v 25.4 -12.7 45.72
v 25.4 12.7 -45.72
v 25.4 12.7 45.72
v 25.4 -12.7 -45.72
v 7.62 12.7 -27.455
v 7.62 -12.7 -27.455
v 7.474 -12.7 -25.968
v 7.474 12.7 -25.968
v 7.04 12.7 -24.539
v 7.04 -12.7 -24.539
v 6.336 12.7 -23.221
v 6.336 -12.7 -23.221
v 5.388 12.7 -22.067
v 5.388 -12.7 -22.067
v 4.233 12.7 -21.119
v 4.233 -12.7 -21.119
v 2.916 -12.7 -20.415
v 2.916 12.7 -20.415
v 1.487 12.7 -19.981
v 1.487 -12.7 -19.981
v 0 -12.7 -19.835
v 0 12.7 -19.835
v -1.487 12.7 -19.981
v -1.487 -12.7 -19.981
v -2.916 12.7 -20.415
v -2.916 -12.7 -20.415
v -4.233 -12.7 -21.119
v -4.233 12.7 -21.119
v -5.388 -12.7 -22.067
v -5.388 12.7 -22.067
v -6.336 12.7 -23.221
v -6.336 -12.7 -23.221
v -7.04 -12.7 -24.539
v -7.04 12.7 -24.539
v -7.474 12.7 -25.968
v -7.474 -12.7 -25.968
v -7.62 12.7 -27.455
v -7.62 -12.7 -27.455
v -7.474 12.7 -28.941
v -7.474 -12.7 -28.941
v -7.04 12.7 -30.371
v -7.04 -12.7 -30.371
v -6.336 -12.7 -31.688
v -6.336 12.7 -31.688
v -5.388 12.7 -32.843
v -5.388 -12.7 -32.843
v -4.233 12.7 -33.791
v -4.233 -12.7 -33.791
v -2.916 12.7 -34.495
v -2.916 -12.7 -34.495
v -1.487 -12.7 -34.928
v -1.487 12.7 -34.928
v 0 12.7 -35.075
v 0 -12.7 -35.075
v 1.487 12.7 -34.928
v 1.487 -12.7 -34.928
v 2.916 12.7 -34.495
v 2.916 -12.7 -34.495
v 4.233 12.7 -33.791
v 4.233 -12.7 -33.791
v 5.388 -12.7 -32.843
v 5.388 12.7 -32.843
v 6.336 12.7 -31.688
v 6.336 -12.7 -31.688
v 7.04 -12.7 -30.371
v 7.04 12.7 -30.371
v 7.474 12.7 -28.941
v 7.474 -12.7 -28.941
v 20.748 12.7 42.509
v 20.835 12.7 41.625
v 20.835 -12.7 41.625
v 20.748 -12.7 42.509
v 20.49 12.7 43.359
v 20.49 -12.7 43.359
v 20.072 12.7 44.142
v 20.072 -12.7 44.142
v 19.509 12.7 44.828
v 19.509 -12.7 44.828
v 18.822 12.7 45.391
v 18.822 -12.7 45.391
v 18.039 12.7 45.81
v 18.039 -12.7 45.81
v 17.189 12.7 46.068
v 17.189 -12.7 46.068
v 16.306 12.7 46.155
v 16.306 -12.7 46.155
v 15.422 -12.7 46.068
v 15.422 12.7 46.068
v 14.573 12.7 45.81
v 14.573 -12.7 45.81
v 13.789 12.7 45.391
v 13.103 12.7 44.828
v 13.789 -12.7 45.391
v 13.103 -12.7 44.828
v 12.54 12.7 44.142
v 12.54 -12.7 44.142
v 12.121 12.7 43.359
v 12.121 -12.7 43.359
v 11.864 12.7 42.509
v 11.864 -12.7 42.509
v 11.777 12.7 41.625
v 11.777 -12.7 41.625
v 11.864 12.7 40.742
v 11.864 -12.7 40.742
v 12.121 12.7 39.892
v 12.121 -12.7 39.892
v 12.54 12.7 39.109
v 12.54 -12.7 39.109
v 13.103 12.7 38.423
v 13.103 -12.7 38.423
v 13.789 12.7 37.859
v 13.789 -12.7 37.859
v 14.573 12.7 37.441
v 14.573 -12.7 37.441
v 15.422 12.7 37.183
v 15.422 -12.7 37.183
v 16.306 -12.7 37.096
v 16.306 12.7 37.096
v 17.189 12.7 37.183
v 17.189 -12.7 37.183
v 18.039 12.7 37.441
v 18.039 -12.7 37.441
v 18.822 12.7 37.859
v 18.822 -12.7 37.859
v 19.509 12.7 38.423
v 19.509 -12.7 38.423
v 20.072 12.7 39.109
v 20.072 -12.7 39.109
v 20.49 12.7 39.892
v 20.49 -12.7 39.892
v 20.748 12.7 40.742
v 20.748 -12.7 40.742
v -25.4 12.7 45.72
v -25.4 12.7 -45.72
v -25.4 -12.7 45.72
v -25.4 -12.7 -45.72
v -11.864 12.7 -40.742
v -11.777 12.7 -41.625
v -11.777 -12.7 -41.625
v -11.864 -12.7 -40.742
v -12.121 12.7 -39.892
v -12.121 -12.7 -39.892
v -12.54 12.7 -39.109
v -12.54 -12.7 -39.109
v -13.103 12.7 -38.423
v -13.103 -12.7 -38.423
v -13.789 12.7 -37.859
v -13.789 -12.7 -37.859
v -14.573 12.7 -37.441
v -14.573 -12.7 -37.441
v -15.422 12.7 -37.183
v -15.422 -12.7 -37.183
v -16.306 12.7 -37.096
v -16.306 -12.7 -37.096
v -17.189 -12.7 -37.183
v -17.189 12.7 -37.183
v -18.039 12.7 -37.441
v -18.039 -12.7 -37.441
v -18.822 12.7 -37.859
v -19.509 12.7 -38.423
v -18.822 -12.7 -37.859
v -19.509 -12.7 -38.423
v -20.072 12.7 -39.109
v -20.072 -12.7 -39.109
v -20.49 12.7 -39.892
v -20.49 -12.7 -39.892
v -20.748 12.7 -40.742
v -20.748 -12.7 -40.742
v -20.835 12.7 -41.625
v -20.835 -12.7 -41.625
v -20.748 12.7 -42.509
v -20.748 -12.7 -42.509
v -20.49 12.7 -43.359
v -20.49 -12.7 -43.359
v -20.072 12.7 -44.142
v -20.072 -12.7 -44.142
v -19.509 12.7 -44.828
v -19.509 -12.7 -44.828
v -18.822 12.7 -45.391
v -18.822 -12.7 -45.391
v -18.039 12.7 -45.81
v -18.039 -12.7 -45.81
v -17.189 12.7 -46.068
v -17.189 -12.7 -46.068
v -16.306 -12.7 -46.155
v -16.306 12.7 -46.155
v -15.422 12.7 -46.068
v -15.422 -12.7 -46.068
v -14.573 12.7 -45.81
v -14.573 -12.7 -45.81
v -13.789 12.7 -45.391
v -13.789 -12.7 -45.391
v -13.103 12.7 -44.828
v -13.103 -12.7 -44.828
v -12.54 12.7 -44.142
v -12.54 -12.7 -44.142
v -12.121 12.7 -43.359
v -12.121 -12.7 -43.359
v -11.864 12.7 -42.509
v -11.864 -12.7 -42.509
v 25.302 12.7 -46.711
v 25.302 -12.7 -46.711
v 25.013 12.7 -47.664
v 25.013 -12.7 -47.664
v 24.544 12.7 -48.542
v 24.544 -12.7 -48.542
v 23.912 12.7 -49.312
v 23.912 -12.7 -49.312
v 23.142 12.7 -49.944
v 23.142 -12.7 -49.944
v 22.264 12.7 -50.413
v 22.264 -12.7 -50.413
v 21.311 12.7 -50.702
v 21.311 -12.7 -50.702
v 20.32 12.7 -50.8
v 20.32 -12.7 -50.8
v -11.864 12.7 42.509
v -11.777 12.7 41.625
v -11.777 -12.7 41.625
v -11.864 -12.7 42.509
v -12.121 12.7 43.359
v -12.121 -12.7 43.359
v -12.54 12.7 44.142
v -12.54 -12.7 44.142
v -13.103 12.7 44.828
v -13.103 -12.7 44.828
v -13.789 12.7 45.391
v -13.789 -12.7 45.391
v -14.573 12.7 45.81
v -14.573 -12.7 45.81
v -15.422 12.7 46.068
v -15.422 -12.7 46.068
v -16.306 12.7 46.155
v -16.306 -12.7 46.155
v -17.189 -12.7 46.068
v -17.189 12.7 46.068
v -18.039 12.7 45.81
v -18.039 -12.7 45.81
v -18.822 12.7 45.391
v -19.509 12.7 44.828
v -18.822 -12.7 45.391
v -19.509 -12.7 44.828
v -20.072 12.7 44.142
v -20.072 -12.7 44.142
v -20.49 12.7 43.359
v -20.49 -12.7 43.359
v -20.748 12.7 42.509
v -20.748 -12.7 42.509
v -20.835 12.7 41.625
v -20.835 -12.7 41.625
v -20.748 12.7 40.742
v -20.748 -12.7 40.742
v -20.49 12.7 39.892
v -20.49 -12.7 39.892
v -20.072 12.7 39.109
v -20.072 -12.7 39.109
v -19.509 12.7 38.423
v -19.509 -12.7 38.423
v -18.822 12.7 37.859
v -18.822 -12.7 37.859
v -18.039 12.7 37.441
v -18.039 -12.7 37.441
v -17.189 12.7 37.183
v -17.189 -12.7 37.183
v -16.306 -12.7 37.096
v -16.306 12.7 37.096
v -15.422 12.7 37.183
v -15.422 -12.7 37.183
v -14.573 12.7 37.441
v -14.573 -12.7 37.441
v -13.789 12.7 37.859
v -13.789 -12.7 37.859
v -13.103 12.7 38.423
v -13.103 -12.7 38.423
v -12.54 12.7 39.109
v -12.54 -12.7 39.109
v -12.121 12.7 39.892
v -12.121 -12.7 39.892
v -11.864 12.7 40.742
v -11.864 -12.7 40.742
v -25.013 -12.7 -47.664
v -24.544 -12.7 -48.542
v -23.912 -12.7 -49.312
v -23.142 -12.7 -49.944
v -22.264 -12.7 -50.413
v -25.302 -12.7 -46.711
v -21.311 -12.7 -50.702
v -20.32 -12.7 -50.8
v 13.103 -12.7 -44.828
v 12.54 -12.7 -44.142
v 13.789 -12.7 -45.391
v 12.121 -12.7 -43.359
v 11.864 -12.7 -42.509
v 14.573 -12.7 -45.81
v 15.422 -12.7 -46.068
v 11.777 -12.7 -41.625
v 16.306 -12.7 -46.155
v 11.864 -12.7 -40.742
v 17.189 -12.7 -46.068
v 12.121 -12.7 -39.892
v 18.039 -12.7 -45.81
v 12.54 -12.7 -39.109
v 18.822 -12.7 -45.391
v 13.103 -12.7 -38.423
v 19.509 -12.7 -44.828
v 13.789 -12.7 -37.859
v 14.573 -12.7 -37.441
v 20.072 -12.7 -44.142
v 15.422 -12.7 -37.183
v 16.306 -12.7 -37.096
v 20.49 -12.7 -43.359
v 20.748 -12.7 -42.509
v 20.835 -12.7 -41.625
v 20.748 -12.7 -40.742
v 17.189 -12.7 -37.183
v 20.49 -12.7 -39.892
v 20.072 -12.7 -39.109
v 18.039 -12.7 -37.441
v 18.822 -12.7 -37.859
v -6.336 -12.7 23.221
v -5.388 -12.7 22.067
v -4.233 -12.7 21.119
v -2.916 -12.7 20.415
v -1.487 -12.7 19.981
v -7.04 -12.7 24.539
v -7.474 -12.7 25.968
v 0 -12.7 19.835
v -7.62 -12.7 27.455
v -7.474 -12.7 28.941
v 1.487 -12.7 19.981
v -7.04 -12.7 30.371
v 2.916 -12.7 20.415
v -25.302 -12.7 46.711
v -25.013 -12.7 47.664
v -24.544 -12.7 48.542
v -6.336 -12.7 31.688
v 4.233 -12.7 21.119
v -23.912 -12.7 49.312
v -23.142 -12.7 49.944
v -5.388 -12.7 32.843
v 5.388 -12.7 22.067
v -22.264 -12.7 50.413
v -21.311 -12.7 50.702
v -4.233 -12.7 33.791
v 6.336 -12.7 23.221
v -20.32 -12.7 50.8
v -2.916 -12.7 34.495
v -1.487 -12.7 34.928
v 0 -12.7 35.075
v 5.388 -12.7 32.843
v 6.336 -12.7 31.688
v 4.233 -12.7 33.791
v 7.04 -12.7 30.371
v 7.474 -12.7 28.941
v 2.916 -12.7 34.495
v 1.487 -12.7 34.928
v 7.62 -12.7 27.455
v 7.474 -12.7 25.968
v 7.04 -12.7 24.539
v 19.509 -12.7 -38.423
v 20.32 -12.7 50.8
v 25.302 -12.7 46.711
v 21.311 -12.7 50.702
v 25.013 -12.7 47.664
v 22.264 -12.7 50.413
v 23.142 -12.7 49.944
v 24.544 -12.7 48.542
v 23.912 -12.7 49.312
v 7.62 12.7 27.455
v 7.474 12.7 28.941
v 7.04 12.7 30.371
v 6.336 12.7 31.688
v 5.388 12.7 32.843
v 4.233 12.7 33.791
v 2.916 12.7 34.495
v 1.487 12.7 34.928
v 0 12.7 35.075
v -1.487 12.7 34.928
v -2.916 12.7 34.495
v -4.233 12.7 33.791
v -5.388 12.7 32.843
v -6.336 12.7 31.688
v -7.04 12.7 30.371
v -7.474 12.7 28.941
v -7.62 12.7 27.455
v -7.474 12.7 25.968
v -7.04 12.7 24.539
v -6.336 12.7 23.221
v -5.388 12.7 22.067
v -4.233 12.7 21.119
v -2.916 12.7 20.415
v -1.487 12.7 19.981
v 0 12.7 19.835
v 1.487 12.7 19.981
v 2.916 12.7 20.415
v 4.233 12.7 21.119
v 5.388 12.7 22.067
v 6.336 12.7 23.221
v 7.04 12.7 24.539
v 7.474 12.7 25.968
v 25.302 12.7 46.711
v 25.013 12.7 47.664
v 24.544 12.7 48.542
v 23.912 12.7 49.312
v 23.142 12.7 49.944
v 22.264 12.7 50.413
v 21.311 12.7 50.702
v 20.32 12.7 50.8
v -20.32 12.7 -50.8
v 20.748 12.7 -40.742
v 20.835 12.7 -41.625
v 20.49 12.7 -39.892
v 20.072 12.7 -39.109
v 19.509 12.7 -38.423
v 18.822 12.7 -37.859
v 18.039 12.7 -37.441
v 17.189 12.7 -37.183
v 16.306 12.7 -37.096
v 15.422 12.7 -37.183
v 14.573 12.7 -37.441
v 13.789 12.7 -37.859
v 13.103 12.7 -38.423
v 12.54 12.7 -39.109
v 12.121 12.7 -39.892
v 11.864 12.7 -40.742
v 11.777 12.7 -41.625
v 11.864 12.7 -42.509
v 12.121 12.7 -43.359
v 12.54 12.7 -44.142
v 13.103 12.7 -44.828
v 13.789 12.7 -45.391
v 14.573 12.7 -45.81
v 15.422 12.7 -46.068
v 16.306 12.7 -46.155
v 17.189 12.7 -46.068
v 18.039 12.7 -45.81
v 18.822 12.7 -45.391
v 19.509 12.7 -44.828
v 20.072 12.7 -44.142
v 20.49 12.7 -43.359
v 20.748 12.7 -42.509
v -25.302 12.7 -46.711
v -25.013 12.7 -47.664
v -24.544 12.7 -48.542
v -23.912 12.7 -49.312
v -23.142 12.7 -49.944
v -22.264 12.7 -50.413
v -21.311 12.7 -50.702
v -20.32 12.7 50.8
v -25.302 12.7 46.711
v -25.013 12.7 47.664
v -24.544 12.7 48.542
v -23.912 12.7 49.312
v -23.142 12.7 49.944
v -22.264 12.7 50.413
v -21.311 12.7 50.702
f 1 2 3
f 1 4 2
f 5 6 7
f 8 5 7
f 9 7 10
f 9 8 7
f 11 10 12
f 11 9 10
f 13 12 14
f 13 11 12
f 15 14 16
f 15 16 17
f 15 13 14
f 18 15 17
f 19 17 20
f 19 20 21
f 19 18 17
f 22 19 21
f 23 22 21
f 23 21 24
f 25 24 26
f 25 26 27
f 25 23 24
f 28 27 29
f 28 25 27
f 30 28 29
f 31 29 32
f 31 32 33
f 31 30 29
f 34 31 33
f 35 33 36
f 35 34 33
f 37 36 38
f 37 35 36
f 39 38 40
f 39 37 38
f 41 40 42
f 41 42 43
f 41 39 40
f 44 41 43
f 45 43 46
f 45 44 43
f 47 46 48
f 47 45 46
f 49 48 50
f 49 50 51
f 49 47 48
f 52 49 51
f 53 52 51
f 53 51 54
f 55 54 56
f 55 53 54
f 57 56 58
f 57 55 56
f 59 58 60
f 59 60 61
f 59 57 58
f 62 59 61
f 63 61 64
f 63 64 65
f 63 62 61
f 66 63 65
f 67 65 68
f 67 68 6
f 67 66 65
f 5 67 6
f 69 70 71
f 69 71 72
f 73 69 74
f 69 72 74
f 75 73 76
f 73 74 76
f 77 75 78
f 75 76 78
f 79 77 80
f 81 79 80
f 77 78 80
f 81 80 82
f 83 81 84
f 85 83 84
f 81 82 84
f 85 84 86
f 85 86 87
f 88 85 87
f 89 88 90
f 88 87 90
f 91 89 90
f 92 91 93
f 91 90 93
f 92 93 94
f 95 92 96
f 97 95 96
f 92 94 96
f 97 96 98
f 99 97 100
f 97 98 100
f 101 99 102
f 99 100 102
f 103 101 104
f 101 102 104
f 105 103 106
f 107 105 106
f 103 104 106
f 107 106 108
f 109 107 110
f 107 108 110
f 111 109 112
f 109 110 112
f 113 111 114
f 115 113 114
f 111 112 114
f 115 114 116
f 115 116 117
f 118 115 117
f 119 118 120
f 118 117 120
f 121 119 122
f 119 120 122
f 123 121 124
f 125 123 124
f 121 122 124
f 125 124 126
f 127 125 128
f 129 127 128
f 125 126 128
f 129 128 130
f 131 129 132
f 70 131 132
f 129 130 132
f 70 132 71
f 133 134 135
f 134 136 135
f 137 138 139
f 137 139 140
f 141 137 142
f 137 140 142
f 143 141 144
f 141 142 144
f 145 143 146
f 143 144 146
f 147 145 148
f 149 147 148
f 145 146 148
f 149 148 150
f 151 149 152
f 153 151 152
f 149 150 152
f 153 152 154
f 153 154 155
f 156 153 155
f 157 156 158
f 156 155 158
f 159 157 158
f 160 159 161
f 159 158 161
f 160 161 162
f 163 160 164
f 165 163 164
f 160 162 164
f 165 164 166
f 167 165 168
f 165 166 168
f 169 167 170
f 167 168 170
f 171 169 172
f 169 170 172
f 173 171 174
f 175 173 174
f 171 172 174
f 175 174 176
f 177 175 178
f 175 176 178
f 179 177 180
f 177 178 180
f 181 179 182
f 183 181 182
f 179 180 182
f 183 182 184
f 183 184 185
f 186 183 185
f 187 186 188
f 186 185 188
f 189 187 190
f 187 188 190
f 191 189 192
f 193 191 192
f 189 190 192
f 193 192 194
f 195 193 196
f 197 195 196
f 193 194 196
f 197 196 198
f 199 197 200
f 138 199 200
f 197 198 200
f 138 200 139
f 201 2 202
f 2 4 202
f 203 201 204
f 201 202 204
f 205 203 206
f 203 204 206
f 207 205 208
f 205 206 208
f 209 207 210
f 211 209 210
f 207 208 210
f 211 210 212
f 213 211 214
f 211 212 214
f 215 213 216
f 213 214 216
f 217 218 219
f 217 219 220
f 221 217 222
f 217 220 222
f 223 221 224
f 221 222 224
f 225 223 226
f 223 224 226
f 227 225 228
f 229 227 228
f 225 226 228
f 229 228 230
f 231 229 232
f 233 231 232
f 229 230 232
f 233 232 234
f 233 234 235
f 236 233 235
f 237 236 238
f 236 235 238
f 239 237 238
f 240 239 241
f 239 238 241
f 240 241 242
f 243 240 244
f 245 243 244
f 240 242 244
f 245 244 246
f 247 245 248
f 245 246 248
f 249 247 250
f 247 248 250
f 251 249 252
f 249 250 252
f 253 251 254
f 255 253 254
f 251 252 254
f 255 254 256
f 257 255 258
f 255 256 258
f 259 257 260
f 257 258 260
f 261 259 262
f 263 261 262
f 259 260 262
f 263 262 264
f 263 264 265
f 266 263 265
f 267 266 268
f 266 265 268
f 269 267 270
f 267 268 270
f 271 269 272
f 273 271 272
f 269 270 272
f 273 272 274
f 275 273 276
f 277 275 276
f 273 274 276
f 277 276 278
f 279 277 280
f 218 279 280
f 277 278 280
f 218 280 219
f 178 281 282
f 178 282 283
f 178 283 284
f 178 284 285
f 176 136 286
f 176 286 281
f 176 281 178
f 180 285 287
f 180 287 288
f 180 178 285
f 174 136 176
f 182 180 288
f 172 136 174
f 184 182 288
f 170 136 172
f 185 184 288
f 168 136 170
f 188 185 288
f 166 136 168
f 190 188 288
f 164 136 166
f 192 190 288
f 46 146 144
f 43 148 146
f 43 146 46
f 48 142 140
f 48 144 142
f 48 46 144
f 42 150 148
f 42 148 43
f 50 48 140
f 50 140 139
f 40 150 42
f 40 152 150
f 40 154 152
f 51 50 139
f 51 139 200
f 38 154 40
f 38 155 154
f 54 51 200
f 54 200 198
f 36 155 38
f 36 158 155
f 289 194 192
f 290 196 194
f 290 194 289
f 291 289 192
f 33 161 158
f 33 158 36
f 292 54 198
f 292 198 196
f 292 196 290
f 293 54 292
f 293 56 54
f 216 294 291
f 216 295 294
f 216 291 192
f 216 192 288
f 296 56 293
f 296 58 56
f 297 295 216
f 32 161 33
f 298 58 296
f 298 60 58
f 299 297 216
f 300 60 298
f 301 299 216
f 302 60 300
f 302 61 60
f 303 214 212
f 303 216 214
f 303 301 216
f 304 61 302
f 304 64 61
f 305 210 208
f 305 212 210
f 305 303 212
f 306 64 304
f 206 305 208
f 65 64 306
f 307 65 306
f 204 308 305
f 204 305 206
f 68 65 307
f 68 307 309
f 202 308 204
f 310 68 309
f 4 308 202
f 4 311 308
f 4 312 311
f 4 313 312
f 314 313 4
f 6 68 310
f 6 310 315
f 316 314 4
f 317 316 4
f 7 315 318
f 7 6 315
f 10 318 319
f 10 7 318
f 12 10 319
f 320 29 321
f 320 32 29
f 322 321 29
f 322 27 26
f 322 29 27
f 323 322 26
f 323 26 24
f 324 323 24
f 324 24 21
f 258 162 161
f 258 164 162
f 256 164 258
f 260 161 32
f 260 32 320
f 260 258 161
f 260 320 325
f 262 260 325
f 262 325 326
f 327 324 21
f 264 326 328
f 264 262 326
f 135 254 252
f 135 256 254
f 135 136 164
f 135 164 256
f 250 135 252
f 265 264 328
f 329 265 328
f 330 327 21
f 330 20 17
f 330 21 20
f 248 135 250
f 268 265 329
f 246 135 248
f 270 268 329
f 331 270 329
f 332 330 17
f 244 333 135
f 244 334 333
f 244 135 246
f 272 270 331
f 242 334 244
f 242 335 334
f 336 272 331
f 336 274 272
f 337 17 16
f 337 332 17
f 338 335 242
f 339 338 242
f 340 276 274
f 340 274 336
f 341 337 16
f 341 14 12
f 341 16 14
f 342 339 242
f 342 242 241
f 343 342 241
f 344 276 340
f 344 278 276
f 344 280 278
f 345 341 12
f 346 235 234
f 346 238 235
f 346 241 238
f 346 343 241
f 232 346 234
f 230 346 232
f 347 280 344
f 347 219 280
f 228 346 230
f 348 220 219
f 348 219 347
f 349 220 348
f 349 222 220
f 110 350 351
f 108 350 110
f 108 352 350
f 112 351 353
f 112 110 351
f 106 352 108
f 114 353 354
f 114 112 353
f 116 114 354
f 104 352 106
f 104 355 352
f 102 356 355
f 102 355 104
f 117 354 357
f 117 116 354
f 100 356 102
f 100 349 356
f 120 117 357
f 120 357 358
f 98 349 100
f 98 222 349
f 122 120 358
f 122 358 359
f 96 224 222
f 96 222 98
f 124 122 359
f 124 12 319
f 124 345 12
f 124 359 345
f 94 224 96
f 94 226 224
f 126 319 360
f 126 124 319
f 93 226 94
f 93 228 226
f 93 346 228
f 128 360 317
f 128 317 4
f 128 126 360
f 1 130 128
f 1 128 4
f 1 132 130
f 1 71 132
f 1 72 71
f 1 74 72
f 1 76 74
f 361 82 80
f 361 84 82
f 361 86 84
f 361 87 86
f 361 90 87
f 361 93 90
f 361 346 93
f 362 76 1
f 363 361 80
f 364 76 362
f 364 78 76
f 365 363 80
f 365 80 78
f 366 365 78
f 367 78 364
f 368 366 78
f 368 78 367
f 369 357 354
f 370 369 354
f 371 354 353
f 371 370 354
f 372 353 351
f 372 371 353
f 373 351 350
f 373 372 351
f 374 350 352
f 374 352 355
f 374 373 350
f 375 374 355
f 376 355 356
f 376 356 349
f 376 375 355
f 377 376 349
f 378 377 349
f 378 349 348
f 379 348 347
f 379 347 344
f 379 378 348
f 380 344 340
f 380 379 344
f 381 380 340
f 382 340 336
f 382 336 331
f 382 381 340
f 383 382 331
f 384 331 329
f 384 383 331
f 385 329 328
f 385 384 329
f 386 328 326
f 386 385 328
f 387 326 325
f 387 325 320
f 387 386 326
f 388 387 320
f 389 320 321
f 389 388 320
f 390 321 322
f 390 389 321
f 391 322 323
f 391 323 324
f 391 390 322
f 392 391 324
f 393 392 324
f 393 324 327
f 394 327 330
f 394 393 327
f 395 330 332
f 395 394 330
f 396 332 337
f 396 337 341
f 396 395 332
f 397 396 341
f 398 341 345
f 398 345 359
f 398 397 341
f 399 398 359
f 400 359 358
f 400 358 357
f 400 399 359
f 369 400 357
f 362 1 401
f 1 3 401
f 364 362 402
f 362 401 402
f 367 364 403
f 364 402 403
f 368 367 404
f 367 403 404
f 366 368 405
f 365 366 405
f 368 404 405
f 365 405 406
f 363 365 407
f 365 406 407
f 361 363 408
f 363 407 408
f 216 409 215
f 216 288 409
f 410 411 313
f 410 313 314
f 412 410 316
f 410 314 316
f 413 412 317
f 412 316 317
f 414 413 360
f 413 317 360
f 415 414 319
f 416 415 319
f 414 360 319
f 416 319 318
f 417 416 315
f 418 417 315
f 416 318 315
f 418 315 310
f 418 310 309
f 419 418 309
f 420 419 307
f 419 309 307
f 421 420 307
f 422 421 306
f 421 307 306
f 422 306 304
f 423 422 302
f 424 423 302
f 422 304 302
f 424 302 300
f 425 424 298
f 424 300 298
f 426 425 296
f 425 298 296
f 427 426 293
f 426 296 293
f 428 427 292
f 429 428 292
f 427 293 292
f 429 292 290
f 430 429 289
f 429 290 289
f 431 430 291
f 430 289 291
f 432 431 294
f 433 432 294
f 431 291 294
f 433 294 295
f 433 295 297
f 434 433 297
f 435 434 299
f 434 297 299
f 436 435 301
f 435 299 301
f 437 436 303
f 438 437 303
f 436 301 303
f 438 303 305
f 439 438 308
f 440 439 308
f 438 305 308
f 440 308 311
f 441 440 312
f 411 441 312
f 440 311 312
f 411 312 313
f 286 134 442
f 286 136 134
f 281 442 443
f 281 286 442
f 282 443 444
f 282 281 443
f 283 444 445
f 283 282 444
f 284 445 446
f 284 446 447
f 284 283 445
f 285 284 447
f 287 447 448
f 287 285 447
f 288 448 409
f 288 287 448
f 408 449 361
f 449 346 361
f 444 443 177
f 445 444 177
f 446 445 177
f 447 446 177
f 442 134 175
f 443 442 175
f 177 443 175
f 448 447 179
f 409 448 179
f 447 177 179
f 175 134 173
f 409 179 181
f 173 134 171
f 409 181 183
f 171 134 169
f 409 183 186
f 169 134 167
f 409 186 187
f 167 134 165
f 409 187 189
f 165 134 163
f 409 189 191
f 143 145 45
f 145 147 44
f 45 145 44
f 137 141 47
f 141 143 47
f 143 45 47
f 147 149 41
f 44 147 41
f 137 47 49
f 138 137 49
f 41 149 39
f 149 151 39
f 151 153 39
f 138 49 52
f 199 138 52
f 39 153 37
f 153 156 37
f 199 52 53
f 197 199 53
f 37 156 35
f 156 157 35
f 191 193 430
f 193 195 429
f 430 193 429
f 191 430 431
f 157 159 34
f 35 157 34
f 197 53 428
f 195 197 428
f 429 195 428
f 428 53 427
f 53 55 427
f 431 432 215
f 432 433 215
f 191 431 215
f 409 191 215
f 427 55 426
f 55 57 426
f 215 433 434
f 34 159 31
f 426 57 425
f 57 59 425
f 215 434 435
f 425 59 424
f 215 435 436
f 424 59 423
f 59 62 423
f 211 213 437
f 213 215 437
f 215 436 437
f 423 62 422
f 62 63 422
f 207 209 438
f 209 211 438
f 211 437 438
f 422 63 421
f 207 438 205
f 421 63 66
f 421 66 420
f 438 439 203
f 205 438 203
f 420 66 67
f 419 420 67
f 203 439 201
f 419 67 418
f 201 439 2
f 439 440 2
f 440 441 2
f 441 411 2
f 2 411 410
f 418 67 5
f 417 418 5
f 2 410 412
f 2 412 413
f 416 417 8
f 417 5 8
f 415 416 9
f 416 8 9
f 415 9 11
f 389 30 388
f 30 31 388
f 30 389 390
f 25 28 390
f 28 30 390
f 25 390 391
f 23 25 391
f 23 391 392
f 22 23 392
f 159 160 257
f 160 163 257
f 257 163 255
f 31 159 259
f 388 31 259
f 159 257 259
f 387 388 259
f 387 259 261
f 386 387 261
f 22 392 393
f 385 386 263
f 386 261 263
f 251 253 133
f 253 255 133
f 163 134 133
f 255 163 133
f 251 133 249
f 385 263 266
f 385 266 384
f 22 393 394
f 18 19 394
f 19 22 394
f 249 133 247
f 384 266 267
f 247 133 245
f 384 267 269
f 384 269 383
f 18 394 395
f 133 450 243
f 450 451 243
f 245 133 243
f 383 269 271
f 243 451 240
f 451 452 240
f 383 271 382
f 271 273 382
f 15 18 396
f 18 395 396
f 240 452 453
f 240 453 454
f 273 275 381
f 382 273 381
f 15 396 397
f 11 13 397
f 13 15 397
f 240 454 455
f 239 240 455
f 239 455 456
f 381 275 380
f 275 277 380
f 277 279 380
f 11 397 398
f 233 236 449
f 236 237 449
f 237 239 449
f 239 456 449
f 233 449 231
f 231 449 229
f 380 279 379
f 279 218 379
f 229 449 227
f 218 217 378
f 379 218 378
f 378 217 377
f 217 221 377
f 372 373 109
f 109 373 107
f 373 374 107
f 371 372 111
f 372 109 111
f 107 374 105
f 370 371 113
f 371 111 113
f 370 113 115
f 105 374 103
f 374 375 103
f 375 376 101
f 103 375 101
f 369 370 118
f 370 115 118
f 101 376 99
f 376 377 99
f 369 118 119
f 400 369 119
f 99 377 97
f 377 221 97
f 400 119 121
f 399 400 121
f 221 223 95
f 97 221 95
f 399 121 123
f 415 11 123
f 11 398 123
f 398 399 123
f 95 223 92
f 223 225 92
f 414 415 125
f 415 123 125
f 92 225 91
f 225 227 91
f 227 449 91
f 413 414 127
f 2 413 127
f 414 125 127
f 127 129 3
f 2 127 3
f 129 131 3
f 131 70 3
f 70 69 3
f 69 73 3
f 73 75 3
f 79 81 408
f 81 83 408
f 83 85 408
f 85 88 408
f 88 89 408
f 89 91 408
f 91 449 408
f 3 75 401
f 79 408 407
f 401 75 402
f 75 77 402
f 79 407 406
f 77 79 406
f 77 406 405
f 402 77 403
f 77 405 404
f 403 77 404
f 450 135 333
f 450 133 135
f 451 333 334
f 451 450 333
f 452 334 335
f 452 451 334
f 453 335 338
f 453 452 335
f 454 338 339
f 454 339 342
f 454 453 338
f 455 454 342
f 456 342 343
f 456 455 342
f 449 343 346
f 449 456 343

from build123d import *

# Parameters (mm, degrees)
F0_W     = 50.8
F0_H     = 101.6
F0_R     = 7.62
F1_DEPTH = 12.7
F2_R     = 5.08
F3_R     = 4.529312
F4_DEPTH = 25.4


with BuildPart() as f1:
    # F0 (on Front) → F1 (new body, symmetric)
    with BuildSketch(Plane.XZ):
        Rectangle(F0_W, F0_H)
        with Locations((0, -27.454738)):
            Circle(F0_R, mode=Mode.SUBTRACT)
        with Locations((0, 27.454738)):
            Circle(F0_R, mode=Mode.SUBTRACT)
    extrude(amount=F1_DEPTH, both=True)

    # F2
    f2_edges = [f1.edges().sort_by_distance(p)[0] for p in [
        (25.4, 0, 50.8),
        (-25.4, 0, 50.8),
        (-25.4, 0, -50.8),
        (25.4, 0, -50.8),
    ]]
    fillet(f2_edges, radius=F2_R)

    # F3 (on face) → F4 (cut, through all)
    with BuildSketch(Plane.XZ.offset(12.7)):
        with Locations((-16.305836, 41.625459)):
            Circle(F3_R)
        with Locations((16.305836, 41.625459)):
            Circle(F3_R)
        with Locations((-16.305836, -41.625459)):
            Circle(F3_R)
        with Locations((16.305836, -41.625459)):
            Circle(F3_R)
    extrude(amount=-F4_DEPTH, mode=Mode.SUBTRACT)


solid = f1.part
